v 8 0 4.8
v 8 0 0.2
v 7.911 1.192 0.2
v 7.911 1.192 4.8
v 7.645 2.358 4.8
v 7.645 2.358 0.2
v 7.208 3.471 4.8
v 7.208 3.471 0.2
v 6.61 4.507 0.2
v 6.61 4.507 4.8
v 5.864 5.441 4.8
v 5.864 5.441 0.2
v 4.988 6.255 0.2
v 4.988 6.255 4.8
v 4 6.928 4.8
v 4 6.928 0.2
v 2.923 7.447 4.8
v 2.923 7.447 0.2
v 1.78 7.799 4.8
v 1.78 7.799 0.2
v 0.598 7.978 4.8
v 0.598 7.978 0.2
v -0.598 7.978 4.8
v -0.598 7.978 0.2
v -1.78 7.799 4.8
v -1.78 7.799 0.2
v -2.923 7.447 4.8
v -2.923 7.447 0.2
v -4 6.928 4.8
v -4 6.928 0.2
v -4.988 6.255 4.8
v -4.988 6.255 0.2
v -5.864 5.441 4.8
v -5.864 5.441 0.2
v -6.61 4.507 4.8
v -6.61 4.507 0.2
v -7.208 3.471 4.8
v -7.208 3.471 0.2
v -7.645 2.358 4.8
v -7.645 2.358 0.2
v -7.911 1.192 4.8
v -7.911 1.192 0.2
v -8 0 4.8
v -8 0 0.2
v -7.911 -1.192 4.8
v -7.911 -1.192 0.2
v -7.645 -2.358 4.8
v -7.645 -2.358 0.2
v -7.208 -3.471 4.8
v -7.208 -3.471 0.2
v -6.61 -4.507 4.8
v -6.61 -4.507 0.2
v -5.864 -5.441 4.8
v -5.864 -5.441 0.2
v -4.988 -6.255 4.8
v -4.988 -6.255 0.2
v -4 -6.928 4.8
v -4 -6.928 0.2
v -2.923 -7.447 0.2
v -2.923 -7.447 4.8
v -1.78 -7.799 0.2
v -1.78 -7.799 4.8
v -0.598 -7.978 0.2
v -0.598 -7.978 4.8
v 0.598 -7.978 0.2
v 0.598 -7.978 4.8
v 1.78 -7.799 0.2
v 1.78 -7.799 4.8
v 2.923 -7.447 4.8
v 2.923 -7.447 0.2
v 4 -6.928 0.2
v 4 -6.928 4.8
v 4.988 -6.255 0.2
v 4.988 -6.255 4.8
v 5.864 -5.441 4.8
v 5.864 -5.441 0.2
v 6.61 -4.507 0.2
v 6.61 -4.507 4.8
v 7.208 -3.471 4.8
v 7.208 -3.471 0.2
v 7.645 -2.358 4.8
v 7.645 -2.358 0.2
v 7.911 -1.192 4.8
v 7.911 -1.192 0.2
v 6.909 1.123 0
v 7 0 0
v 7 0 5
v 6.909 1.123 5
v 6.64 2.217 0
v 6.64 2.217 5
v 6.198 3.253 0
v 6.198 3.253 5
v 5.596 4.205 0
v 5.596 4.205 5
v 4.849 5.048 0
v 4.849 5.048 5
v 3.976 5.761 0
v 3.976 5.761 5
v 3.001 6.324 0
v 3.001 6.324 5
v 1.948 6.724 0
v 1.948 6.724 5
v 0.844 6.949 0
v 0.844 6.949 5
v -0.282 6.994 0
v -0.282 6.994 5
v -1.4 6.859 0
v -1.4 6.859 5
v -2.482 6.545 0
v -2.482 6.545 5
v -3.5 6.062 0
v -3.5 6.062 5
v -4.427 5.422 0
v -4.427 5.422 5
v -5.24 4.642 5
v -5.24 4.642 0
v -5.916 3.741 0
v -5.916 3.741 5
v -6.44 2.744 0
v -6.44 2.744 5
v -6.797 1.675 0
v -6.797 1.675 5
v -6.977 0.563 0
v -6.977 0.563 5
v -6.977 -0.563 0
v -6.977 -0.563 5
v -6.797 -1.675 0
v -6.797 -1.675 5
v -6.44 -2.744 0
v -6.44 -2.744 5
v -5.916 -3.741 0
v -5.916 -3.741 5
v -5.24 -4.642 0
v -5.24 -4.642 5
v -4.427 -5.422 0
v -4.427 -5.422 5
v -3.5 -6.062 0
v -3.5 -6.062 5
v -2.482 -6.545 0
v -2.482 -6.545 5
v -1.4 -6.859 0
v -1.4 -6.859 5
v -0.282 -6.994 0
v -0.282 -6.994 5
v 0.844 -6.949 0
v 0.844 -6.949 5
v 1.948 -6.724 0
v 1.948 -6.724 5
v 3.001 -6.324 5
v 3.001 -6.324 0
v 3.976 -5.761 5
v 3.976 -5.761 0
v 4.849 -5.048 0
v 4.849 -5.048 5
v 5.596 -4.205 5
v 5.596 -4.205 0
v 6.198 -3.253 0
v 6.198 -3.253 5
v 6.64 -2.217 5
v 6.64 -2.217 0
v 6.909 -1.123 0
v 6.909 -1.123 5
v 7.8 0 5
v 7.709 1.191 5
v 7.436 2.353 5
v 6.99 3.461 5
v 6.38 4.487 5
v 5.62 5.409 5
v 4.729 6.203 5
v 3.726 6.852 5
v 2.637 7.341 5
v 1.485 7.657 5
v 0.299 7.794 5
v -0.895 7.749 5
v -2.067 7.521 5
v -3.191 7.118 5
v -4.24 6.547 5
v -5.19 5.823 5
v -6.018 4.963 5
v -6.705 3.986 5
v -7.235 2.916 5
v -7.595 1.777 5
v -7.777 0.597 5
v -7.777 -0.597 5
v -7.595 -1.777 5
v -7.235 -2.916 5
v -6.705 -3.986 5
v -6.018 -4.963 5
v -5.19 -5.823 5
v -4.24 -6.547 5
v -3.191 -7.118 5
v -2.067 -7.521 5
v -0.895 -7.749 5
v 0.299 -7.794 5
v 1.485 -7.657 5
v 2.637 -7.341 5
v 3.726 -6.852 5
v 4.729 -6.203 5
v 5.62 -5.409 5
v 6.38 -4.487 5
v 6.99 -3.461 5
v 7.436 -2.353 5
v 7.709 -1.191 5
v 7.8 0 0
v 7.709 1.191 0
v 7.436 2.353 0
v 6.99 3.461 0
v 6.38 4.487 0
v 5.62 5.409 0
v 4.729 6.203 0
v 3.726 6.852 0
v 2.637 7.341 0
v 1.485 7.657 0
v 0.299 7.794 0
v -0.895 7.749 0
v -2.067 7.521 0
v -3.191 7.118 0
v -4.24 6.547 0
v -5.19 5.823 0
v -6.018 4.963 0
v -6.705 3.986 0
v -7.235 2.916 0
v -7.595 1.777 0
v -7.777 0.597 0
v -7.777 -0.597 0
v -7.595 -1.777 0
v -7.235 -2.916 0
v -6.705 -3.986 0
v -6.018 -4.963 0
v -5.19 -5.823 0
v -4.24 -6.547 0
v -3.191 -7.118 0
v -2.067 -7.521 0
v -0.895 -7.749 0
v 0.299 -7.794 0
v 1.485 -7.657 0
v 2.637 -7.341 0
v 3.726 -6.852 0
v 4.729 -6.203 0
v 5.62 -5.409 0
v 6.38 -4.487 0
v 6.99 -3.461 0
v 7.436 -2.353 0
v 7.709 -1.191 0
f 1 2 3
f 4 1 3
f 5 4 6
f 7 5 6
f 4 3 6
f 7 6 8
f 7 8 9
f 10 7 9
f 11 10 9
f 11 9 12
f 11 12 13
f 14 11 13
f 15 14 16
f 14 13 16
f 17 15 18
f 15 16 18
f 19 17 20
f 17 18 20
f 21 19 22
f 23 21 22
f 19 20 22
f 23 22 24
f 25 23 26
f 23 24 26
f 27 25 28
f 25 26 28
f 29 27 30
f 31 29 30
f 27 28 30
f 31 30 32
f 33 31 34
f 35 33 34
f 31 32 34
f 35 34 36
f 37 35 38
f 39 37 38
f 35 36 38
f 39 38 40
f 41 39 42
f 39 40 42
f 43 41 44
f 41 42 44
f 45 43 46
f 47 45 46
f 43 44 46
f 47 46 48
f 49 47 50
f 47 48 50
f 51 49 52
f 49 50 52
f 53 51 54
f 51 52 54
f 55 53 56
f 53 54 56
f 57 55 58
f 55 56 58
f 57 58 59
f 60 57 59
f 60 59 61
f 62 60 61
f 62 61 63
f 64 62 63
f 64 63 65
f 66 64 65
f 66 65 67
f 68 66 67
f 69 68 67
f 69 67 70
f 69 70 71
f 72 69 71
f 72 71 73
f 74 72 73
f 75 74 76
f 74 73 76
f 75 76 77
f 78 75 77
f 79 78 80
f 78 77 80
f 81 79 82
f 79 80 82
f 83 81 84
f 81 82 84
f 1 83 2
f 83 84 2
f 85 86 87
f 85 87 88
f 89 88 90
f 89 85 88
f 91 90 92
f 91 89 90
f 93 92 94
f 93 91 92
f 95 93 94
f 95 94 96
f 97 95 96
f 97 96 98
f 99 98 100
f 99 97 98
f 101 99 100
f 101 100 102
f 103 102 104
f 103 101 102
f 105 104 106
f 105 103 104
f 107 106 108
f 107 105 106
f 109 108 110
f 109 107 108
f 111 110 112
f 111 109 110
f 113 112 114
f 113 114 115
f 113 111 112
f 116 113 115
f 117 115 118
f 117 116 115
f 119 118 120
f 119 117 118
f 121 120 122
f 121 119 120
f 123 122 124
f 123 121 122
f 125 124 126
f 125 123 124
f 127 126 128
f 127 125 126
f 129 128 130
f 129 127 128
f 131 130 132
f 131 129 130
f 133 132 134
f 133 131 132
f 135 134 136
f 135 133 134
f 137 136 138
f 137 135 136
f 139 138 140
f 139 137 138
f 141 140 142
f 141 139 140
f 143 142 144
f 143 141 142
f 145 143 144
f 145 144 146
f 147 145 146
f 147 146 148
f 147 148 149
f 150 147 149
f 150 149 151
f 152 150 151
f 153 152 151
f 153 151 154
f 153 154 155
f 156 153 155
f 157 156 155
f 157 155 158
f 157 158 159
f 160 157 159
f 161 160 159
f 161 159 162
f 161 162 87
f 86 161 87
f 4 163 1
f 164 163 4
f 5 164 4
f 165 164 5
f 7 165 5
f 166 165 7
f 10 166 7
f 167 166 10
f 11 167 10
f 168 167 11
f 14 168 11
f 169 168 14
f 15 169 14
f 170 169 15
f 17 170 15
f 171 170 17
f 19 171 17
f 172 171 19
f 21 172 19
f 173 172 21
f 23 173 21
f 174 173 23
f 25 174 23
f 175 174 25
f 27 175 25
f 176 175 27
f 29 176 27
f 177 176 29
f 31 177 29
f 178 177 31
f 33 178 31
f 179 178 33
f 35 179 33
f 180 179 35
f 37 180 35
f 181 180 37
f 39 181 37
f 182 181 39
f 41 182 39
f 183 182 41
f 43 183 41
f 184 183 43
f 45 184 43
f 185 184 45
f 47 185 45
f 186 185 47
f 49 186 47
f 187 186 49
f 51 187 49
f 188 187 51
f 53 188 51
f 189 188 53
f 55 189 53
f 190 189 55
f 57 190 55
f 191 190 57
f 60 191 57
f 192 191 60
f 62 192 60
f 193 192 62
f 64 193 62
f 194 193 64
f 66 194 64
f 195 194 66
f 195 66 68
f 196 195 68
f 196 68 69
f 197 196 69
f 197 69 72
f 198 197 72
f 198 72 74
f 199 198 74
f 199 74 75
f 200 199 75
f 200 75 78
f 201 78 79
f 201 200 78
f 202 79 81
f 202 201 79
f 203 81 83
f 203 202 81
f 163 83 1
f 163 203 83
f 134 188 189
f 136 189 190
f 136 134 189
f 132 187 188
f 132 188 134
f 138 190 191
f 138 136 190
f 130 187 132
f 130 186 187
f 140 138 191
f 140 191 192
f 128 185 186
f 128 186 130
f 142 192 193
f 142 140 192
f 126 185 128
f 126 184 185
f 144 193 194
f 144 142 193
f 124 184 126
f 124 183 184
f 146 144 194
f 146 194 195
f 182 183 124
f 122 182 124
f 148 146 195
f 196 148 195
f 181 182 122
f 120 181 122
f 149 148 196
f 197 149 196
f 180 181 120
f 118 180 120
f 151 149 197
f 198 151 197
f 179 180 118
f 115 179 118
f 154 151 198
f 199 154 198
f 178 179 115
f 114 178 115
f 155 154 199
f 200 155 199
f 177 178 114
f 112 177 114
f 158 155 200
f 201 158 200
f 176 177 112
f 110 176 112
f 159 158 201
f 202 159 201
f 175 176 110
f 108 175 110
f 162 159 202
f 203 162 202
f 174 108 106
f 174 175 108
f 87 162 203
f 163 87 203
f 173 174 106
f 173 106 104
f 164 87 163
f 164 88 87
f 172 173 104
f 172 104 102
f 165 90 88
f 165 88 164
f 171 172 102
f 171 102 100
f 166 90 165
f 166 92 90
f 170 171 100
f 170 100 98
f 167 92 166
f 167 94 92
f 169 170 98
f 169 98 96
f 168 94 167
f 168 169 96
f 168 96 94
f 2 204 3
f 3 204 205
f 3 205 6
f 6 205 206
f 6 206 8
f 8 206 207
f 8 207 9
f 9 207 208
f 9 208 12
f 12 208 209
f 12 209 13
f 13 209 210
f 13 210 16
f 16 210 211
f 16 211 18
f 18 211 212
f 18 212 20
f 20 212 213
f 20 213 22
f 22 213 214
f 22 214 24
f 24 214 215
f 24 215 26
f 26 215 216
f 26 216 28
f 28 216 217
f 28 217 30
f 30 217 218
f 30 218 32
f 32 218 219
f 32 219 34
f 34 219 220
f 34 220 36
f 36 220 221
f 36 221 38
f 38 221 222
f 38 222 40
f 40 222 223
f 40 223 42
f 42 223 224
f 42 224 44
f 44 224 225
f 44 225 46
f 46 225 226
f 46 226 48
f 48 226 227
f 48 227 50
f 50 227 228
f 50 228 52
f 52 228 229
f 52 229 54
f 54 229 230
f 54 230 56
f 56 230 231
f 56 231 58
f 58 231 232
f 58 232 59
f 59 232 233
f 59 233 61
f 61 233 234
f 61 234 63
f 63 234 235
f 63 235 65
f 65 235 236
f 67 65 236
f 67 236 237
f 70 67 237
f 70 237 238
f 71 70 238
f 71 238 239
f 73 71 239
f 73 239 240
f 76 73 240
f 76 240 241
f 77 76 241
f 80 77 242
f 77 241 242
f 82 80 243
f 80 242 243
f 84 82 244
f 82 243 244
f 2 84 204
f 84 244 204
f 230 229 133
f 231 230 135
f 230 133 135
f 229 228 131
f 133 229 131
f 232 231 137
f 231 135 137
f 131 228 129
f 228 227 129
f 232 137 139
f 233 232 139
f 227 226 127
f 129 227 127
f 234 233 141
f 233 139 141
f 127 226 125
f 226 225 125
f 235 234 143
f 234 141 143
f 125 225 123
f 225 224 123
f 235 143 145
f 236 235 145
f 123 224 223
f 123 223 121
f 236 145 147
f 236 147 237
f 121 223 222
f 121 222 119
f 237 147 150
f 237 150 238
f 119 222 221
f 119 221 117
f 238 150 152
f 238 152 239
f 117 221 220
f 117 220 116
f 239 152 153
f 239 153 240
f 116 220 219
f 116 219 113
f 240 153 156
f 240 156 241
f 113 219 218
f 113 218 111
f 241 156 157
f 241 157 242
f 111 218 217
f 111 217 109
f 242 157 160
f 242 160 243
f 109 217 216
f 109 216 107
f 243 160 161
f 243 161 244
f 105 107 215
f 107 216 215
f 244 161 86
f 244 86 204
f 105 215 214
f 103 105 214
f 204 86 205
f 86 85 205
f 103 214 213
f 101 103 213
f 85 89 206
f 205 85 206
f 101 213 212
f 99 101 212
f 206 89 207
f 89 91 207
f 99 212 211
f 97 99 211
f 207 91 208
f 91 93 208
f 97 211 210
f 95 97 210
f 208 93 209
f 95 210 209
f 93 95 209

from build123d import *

# Parameters (mm, degrees)
CYLINDER002_R     = 7
CYLINDER002_DEPTH = 5
CYLINDER_R        = 8
CYLINDER_DEPTH    = 5
CHAMFER004_SIZE   = 0.2


with BuildPart() as cilindro:
    # Cylinder002 → Cylinder002 (new body)
    with BuildSketch(Plane.XY):
        Circle(CYLINDER002_R)
    extrude(amount=CYLINDER002_DEPTH)


with BuildPart() as exterior001:
    # Cylinder → Cylinder (new body)
    with BuildSketch(Plane.XY):
        Circle(CYLINDER_R)
    extrude(amount=CYLINDER_DEPTH)

    # Cut: cut Cilindro
    add(cilindro.part, mode=Mode.SUBTRACT)

    # Chamfer004
    chamfer004_edges = [exterior001.edges().sort_by_distance(p)[0] for p in [
        (-8, 0, 5),
        (-8, 0, 0),
    ]]
    chamfer(chamfer004_edges, length=CHAMFER004_SIZE)


solid = exterior001.part
